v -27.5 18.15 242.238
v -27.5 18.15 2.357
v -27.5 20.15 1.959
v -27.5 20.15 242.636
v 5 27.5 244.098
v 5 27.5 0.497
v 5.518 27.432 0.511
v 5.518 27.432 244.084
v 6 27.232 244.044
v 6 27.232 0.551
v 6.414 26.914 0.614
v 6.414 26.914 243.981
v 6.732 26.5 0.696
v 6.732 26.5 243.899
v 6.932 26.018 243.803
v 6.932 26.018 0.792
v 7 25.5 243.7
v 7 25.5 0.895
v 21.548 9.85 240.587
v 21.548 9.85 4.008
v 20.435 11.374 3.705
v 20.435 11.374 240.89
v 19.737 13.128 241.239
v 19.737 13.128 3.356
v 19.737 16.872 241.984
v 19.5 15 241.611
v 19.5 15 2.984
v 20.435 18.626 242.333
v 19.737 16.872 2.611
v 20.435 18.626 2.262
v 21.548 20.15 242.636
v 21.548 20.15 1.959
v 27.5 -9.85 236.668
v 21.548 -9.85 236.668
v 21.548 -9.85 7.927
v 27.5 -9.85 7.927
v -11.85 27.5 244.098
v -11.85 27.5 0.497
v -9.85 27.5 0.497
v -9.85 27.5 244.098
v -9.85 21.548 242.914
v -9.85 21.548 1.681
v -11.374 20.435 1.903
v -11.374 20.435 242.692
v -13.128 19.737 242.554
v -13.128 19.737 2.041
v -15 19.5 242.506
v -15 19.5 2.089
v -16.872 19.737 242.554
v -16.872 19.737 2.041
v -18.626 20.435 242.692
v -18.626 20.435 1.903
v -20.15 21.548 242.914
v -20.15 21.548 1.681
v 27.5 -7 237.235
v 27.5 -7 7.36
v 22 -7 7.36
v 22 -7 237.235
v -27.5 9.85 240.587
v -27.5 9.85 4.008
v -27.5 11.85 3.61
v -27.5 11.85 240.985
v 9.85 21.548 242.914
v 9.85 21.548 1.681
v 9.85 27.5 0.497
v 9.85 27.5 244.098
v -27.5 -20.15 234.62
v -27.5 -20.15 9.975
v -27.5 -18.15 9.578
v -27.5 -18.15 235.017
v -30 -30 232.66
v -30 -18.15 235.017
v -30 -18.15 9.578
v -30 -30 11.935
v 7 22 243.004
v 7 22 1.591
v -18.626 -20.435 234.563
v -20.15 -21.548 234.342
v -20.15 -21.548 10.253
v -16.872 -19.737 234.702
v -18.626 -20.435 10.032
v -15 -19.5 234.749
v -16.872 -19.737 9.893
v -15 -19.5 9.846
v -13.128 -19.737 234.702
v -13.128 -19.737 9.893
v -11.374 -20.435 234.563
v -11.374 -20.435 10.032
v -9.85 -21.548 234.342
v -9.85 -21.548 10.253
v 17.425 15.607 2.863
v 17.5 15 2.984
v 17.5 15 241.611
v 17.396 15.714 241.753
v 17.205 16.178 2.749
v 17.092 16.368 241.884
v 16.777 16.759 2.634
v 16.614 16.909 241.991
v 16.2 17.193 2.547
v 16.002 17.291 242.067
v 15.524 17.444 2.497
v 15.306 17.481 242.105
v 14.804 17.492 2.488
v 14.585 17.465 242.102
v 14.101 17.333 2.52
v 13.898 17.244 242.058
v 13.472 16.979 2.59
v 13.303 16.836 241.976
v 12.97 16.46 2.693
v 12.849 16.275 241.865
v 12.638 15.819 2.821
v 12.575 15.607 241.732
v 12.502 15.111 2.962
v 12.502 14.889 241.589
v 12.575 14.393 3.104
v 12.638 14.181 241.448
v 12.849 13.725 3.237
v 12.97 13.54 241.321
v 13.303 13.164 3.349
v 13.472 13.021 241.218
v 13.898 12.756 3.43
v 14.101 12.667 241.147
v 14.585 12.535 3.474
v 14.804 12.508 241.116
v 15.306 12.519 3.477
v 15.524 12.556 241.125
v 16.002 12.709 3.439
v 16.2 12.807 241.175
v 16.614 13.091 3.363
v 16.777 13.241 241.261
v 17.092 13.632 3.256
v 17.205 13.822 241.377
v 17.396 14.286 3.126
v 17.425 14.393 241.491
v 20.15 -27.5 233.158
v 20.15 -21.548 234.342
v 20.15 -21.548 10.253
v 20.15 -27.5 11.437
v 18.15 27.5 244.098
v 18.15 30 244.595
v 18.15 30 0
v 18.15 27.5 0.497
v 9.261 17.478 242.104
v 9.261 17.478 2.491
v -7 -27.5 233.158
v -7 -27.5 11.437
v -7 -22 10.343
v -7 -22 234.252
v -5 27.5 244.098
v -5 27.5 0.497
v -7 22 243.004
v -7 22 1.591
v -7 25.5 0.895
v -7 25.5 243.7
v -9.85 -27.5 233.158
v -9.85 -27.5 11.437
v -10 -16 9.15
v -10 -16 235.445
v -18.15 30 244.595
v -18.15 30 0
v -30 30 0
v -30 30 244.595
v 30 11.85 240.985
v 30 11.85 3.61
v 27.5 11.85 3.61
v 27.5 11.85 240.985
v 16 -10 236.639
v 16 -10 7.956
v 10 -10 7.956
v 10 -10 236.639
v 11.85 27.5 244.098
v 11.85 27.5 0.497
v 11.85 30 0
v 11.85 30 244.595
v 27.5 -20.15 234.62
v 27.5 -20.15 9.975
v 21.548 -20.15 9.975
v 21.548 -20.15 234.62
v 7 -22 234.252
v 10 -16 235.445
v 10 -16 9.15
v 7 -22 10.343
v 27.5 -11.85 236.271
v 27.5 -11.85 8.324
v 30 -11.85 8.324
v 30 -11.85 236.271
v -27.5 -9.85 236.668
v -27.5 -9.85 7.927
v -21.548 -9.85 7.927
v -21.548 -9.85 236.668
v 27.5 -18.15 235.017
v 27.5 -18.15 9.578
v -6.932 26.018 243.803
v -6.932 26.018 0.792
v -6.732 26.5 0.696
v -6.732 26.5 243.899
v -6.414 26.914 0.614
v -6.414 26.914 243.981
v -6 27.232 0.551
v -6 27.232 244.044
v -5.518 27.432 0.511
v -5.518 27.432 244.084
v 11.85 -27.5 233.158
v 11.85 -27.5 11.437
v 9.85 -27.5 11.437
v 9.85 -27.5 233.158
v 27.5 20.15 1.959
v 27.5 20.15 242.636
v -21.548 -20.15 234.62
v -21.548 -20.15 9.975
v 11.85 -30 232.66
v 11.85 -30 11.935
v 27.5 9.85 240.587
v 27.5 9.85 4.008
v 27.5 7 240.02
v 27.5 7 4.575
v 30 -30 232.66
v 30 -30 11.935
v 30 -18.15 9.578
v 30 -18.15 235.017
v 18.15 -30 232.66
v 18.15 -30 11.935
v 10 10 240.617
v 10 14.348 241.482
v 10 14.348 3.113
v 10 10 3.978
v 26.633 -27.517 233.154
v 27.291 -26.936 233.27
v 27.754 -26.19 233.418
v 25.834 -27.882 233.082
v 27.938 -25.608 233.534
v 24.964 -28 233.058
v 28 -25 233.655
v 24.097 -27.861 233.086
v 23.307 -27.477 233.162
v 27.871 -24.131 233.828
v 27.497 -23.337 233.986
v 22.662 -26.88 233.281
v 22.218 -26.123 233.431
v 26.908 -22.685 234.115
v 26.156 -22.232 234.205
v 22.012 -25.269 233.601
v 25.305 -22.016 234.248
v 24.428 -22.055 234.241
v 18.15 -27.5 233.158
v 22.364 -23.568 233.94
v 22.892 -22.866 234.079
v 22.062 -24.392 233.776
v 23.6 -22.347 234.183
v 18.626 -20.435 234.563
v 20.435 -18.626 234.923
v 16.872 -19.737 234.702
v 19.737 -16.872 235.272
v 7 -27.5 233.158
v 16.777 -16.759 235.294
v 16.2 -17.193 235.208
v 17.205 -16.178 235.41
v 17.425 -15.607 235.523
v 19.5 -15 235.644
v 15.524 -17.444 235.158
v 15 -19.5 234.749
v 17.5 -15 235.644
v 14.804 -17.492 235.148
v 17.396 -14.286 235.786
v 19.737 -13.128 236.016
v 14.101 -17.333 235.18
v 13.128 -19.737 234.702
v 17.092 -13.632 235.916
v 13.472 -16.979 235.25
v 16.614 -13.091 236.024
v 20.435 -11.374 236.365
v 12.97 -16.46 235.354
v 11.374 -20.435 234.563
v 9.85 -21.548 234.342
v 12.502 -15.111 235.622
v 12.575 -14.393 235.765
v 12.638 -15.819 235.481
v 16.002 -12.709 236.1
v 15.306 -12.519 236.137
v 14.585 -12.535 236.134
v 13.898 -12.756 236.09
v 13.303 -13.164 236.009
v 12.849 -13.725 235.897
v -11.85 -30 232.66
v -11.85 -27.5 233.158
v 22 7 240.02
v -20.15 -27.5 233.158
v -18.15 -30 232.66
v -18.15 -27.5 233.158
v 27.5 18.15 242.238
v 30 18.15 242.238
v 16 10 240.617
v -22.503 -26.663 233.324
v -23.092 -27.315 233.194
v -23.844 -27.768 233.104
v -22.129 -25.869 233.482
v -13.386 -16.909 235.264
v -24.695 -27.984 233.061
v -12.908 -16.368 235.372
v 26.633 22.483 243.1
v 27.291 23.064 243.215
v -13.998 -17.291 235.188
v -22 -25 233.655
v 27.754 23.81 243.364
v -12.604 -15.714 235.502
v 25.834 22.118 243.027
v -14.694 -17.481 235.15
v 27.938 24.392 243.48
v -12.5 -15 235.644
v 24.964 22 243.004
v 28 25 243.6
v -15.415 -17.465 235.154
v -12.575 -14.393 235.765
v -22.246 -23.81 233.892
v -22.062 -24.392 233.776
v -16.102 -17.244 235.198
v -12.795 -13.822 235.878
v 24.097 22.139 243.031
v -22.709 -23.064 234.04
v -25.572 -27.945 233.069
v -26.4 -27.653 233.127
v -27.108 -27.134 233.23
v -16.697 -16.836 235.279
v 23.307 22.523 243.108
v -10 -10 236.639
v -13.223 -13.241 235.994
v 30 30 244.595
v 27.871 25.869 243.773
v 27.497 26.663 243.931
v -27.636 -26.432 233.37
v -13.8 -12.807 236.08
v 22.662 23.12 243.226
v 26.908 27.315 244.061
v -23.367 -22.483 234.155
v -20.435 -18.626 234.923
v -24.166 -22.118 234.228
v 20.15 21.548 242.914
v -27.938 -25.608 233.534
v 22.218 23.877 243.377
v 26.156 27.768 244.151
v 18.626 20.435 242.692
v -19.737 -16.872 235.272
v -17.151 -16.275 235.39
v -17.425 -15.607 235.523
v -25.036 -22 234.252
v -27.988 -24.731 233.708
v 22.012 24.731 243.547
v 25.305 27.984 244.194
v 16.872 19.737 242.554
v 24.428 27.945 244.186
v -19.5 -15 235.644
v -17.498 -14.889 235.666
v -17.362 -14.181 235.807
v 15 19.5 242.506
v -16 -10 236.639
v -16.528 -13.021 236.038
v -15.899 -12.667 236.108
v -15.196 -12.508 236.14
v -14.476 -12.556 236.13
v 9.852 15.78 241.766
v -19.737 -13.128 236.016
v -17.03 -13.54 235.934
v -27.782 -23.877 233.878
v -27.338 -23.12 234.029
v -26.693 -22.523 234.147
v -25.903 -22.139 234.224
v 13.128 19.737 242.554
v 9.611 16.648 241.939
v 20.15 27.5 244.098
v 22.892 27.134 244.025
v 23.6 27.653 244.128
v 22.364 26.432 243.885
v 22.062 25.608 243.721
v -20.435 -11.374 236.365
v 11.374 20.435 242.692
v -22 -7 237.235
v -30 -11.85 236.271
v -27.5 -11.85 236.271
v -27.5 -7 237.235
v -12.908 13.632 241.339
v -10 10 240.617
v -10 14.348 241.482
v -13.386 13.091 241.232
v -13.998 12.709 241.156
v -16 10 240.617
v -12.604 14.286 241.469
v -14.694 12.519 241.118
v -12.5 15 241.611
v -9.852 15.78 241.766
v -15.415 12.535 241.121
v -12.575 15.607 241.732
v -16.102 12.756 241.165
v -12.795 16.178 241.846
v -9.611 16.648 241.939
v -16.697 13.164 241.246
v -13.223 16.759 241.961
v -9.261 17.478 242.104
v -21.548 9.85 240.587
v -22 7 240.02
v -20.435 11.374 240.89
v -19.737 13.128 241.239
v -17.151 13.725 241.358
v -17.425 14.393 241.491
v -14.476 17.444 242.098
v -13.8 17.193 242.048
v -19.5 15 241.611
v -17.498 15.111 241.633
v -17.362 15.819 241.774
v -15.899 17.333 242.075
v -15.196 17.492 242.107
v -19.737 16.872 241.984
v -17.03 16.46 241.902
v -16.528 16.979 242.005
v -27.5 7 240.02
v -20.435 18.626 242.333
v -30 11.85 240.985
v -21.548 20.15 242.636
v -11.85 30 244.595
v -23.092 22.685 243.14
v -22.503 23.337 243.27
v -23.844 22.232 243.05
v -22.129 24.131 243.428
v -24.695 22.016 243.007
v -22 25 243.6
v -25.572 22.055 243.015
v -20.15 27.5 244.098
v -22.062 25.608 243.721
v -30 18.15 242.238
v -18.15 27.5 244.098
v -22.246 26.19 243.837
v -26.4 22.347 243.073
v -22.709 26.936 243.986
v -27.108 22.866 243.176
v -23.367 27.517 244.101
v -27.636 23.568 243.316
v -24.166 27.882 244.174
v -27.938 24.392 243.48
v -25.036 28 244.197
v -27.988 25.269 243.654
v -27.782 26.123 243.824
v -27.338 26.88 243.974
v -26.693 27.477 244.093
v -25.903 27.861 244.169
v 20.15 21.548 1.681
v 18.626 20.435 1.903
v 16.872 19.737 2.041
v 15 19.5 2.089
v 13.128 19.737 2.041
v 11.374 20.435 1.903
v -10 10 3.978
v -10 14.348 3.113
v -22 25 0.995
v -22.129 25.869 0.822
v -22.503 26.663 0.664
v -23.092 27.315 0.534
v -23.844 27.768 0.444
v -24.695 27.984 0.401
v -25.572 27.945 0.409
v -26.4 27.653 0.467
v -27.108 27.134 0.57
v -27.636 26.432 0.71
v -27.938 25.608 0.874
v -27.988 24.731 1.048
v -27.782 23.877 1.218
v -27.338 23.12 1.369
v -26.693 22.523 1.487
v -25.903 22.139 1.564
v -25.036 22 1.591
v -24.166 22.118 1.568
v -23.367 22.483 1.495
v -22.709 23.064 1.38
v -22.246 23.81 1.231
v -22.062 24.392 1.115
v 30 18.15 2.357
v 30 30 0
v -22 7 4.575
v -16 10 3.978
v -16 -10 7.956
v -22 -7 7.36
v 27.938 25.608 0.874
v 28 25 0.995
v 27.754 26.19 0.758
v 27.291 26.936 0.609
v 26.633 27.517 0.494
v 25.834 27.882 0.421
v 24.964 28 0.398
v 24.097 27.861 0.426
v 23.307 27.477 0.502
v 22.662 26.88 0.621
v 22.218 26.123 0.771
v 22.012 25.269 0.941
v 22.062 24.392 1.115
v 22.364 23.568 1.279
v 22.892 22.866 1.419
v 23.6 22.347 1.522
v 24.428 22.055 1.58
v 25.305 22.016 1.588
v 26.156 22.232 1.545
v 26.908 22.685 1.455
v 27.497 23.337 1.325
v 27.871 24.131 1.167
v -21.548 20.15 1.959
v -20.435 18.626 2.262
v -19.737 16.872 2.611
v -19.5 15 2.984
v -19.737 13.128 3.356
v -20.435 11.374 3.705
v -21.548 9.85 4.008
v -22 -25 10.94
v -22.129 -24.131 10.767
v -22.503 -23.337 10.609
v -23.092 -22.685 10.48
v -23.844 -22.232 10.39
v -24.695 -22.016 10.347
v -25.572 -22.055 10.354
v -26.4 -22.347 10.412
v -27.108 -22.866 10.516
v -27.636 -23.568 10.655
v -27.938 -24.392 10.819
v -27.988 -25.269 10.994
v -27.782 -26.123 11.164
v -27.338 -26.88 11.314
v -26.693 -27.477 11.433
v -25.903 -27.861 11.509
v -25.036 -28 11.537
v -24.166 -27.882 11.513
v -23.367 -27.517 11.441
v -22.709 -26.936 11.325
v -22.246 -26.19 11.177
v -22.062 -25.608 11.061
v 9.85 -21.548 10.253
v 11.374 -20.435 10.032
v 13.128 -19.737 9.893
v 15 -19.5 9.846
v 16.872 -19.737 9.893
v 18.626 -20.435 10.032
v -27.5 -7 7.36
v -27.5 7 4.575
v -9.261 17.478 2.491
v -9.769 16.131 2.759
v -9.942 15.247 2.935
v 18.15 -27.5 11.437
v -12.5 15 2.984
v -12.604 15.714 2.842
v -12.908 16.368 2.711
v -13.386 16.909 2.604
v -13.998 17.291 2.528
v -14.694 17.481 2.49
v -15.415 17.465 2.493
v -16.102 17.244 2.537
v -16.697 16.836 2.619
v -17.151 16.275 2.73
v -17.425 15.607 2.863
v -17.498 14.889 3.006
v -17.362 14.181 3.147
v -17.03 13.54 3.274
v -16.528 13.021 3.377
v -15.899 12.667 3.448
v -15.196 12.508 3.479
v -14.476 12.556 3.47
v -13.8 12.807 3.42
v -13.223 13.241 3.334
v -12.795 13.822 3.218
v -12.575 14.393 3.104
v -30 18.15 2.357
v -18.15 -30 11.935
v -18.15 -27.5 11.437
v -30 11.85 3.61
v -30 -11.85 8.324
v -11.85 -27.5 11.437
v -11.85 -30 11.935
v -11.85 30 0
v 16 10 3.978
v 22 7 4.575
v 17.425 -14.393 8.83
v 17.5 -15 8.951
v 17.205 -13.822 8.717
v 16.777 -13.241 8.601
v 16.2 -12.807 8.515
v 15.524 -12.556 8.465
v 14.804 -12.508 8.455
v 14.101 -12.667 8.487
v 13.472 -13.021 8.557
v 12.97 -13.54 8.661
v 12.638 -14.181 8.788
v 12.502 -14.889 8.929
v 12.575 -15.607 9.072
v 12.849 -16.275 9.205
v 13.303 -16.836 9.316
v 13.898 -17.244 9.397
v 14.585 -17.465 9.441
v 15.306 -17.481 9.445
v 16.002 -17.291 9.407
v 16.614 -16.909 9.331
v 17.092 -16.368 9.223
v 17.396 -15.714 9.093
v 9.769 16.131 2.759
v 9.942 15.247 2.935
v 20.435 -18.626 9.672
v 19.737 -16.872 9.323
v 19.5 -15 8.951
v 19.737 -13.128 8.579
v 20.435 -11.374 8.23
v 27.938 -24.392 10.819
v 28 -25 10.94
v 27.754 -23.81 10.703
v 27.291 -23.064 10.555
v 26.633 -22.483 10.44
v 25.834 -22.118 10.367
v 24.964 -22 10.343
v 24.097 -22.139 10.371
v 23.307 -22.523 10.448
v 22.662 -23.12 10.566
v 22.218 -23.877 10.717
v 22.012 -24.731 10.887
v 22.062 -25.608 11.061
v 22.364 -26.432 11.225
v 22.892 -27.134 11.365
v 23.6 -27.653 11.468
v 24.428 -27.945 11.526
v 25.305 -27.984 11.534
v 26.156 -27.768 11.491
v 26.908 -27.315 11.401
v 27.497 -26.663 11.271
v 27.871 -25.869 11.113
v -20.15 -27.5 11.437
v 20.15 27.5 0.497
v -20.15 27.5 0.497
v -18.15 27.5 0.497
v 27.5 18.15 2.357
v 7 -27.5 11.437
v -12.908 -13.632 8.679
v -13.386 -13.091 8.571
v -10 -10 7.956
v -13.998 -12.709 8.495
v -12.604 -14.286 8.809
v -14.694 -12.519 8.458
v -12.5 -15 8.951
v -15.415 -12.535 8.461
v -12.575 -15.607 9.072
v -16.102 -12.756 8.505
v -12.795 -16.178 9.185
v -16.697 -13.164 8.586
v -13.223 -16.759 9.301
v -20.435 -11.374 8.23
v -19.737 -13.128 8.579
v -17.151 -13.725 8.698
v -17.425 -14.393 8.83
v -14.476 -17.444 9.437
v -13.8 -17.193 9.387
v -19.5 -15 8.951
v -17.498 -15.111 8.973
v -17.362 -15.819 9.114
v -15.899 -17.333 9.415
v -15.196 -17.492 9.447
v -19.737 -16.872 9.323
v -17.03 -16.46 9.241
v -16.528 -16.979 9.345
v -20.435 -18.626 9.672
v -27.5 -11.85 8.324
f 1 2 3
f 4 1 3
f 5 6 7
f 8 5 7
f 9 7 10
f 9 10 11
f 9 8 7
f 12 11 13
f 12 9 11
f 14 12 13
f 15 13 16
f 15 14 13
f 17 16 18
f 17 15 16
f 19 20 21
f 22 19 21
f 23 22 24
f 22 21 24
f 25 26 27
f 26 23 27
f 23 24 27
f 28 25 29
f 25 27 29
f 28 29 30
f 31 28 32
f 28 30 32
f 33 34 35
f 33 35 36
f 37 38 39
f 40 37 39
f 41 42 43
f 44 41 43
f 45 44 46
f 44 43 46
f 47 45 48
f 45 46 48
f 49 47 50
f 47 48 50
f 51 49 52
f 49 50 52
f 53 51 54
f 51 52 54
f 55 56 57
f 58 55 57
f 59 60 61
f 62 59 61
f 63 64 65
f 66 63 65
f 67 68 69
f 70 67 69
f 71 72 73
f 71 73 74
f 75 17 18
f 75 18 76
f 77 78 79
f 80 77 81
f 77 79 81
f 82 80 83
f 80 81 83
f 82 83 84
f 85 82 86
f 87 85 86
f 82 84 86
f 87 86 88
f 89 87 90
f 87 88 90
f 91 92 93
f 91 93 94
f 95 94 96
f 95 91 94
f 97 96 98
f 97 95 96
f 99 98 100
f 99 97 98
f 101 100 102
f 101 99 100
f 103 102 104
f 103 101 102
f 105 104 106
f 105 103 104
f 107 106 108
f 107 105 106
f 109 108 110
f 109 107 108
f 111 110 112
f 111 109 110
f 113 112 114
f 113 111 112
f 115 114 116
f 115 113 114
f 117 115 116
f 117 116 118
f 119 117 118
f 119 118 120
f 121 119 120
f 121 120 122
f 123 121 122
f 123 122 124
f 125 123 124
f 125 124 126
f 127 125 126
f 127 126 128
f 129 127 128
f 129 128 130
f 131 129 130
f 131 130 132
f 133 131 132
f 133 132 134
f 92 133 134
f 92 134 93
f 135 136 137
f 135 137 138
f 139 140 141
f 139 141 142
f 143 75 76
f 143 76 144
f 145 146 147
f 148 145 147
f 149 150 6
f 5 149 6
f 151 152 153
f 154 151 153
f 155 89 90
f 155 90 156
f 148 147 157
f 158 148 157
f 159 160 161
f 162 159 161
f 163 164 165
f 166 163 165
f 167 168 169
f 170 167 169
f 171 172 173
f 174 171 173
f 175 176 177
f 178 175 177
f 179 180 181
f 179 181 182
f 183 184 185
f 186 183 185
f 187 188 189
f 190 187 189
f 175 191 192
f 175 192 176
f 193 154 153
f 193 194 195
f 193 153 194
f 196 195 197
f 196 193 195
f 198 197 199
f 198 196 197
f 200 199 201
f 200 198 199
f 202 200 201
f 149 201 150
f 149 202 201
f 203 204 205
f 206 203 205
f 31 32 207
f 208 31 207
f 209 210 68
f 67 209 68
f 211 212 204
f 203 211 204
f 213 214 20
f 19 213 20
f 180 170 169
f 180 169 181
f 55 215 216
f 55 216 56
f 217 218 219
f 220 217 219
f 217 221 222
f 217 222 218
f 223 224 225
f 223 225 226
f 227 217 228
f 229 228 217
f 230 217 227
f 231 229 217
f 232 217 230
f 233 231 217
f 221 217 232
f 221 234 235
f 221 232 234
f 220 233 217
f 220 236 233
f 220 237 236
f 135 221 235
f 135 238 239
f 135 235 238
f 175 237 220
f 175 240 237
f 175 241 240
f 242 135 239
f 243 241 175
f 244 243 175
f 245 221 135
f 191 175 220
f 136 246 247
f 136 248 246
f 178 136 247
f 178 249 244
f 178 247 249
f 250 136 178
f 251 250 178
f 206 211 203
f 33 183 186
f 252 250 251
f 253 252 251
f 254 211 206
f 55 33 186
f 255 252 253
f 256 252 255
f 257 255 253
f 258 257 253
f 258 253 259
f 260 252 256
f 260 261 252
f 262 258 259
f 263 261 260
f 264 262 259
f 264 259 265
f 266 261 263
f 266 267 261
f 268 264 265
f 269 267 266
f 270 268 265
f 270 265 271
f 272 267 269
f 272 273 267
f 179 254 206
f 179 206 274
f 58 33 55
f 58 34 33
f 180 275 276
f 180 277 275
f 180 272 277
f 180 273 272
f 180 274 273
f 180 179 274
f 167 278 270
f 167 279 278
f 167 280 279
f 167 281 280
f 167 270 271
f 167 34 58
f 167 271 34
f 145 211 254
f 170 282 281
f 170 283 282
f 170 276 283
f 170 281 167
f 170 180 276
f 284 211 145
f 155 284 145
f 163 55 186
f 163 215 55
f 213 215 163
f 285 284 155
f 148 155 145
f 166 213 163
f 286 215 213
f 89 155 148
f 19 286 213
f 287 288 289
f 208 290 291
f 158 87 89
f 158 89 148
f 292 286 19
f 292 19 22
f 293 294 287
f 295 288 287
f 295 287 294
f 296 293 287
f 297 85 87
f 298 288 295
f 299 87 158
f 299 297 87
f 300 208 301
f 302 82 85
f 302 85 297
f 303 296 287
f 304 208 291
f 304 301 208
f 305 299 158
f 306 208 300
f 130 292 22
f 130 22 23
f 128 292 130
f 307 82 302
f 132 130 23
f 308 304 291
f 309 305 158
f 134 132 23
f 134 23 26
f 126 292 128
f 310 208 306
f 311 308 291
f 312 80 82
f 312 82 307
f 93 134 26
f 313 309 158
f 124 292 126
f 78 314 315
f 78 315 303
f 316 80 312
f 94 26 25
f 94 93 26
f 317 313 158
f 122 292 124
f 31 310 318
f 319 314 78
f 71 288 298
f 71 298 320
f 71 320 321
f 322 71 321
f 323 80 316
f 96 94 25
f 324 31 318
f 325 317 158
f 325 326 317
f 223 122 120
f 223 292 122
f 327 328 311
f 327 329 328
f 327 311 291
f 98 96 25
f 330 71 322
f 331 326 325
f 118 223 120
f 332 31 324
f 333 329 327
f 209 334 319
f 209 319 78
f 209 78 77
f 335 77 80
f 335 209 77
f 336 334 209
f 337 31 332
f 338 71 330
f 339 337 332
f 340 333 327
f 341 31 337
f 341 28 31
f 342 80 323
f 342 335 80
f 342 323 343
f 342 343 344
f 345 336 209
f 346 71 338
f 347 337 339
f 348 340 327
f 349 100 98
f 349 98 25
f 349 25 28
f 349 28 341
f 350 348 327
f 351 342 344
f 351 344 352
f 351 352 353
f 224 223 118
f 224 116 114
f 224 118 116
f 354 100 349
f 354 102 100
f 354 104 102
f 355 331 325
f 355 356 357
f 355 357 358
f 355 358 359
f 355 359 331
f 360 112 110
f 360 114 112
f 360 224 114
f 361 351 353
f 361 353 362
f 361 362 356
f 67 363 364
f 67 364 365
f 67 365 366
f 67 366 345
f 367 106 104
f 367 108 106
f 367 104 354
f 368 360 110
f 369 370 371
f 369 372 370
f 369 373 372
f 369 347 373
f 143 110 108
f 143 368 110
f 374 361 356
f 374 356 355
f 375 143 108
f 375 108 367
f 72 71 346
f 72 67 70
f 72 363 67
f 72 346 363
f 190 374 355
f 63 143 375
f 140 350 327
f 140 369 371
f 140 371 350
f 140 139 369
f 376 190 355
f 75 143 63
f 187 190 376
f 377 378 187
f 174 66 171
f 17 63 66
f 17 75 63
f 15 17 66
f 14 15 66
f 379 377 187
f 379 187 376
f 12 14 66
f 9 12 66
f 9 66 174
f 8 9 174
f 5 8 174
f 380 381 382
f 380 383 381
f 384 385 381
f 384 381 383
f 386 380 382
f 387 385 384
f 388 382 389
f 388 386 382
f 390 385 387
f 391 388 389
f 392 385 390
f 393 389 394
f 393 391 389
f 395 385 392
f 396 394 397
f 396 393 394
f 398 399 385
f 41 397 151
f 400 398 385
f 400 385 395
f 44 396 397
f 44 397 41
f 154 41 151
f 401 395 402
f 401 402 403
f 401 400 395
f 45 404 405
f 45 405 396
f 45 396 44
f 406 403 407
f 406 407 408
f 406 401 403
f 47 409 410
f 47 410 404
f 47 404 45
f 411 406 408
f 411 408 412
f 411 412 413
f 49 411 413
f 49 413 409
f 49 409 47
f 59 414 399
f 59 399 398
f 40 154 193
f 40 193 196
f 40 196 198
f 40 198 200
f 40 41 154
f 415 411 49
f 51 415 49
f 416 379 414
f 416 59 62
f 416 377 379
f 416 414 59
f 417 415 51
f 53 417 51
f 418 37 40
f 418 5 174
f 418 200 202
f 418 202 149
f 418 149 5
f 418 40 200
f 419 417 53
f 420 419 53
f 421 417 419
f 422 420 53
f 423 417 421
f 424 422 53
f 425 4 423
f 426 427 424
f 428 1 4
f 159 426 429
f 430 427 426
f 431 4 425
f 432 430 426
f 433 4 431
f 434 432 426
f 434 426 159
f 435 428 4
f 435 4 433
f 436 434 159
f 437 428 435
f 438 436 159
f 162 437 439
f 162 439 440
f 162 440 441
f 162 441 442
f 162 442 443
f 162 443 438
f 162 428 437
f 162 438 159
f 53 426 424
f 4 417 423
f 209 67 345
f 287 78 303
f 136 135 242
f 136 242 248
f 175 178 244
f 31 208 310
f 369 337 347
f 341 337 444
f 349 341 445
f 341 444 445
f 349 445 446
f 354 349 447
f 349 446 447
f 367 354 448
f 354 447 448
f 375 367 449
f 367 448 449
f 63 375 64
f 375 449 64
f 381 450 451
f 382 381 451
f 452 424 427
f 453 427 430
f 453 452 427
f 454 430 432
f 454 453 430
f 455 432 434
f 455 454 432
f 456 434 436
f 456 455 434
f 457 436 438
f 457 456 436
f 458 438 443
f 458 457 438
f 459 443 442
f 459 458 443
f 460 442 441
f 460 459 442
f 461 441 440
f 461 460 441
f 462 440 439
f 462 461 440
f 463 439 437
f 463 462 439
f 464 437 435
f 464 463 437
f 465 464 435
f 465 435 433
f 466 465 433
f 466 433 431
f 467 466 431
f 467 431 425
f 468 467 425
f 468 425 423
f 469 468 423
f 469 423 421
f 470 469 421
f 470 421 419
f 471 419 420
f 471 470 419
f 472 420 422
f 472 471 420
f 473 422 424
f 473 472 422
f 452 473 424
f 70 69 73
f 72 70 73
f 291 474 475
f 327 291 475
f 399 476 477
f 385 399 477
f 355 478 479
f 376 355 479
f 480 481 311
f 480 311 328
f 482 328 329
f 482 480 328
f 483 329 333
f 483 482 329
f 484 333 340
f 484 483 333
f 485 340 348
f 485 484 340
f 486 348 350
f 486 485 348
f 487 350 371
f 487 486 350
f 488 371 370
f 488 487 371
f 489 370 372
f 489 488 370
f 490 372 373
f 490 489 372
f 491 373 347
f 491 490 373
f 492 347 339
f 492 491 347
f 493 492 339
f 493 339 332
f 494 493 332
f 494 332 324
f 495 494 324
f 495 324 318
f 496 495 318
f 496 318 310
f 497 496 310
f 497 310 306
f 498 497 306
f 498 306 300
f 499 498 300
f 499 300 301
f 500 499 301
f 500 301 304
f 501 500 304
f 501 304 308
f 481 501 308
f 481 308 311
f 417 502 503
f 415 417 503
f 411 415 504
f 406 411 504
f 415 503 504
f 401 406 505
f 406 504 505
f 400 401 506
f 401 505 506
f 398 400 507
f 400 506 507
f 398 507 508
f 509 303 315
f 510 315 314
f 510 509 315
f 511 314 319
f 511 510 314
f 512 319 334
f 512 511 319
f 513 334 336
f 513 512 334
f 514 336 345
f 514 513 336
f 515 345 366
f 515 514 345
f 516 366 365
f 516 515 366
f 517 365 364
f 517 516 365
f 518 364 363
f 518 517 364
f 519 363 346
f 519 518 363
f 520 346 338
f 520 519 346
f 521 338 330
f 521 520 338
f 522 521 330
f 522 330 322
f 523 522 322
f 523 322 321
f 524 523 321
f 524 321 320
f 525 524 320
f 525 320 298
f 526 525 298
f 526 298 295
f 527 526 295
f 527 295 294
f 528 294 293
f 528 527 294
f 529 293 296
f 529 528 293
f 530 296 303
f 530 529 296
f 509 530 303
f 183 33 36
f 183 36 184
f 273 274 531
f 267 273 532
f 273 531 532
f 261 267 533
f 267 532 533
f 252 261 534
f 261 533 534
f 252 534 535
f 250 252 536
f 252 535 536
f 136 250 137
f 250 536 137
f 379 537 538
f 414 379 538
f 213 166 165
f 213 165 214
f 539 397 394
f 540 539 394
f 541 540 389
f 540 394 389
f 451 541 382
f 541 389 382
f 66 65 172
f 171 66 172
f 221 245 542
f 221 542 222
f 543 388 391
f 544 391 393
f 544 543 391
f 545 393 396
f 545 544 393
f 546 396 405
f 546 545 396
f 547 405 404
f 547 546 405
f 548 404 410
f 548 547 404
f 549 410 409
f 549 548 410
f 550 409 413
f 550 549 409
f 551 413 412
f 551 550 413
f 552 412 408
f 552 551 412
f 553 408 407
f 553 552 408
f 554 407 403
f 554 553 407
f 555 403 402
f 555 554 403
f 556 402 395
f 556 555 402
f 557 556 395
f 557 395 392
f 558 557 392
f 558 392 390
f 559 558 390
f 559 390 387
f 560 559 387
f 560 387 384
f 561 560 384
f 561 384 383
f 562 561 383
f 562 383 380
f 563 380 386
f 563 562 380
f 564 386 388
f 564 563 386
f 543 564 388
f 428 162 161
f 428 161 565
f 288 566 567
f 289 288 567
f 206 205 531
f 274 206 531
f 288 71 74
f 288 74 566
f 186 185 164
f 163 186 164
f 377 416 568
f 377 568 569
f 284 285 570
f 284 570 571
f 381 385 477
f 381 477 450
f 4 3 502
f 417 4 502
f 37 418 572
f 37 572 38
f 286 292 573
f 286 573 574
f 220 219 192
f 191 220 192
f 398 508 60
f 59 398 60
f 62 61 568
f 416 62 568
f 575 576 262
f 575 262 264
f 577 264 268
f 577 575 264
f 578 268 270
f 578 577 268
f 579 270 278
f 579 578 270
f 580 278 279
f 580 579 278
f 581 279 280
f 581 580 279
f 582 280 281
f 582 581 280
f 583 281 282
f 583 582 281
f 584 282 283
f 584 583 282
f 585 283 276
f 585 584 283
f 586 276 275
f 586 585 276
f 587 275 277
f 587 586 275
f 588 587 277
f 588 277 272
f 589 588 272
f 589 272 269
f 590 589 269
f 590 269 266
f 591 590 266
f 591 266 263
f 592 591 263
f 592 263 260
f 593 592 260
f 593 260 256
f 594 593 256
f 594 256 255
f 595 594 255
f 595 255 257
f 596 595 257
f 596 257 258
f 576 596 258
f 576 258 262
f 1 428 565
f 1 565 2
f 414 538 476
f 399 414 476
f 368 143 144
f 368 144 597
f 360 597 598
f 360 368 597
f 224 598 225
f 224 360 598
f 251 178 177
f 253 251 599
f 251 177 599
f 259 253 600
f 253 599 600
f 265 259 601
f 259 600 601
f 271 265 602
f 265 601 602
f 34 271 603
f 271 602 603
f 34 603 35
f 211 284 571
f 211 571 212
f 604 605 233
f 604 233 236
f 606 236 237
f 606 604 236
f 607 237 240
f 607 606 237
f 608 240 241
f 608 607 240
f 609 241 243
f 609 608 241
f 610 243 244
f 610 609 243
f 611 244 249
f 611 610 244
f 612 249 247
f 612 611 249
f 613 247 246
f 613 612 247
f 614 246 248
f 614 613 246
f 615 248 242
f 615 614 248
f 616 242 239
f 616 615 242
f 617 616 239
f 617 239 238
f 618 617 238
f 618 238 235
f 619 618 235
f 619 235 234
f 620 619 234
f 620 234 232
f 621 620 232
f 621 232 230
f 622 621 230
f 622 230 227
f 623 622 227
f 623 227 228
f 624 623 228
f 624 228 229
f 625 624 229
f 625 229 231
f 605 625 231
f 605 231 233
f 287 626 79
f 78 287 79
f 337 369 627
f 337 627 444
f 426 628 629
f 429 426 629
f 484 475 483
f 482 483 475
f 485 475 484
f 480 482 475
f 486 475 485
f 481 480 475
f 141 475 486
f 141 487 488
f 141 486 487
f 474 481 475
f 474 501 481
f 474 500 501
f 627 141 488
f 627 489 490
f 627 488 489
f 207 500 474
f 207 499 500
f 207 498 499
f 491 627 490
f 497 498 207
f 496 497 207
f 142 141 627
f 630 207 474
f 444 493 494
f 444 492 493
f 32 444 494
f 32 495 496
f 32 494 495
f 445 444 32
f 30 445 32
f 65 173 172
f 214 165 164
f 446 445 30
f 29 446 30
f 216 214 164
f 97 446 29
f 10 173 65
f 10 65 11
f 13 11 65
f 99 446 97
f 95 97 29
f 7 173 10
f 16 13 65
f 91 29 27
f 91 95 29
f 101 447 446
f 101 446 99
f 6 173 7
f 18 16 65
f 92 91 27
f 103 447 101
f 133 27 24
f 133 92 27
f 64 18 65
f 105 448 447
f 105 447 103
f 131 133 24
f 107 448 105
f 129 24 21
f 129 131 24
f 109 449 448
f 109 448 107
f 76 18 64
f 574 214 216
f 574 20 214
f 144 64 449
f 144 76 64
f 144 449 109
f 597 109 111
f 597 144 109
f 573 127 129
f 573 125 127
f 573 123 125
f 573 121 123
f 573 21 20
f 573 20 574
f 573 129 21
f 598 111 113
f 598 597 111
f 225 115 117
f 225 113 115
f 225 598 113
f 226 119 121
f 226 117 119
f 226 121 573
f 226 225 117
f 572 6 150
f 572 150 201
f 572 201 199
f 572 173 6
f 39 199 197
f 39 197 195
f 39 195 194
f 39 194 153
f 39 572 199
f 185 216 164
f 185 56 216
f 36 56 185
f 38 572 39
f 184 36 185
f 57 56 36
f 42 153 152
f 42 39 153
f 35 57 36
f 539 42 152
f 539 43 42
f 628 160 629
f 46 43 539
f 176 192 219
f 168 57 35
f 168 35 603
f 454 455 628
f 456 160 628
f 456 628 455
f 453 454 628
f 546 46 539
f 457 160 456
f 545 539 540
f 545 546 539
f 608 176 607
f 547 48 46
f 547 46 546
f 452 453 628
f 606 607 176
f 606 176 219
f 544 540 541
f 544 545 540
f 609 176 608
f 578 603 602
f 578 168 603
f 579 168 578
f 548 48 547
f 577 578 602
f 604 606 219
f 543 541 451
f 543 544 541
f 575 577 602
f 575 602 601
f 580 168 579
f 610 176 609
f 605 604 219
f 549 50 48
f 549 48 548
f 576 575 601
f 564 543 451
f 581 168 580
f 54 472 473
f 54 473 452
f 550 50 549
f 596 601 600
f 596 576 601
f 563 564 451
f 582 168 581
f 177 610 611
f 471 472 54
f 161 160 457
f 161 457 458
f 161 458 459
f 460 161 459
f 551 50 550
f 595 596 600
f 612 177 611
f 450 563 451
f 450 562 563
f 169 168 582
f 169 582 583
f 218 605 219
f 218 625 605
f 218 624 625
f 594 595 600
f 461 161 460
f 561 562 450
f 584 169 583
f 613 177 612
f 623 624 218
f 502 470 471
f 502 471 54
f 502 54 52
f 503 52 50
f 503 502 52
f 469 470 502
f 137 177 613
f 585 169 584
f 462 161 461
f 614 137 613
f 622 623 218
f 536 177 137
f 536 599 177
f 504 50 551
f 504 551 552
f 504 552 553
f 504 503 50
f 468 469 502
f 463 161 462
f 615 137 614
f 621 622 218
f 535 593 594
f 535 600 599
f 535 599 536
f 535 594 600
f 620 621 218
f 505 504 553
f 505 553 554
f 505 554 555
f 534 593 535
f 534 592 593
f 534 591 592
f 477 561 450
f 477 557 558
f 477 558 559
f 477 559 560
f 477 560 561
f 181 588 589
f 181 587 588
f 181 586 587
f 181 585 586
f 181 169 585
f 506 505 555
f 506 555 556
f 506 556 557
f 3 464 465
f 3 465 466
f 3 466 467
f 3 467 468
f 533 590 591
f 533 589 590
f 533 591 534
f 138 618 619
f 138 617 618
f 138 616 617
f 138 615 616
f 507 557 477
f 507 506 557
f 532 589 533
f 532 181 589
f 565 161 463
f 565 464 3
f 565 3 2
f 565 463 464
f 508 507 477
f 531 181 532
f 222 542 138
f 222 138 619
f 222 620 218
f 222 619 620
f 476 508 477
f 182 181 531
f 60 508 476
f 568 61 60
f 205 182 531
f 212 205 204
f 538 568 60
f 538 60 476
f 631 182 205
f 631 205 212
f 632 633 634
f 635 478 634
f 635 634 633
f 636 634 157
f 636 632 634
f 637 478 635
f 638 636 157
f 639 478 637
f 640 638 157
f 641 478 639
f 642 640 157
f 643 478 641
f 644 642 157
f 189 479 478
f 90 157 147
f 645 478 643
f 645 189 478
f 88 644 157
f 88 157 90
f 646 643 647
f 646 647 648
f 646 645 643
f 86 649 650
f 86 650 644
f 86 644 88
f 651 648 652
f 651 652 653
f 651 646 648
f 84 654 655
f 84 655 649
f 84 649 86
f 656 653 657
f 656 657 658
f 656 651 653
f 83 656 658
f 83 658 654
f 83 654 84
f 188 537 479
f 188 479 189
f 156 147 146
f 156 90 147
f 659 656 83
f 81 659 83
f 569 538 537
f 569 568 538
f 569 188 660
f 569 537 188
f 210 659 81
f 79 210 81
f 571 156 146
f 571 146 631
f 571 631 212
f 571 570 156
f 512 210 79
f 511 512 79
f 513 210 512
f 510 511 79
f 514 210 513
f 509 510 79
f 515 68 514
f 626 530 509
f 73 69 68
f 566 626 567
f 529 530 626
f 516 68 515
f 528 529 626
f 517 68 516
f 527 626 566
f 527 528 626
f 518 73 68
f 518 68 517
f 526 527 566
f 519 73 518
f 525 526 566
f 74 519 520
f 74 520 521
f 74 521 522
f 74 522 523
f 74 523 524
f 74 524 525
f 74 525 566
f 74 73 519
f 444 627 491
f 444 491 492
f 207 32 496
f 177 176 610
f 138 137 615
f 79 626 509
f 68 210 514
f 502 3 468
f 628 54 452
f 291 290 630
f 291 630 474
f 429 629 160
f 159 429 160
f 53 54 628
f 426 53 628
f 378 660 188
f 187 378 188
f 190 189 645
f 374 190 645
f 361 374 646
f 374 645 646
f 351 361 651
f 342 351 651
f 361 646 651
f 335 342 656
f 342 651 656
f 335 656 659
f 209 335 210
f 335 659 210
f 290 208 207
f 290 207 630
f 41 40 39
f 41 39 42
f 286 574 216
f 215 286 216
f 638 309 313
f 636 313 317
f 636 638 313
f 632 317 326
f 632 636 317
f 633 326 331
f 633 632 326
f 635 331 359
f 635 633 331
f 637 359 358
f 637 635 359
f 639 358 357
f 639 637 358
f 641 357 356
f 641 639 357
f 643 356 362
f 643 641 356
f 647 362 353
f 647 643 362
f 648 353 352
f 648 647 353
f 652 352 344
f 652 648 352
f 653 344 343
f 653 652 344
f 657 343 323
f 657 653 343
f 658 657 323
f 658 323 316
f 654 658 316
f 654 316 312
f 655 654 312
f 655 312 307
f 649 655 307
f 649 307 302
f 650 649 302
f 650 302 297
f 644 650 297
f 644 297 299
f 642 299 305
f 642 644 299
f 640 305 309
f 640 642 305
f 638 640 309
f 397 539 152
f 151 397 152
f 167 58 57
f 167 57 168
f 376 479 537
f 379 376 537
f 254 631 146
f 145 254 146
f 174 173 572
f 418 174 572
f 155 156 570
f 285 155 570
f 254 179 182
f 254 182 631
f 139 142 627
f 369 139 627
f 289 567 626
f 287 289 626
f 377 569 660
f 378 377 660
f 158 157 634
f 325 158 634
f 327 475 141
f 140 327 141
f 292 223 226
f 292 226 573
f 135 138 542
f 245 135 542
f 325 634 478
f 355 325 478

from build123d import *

# Parameters (mm, degrees)
F0_R          = 3
F0_R_2        = 2.5
F1_DEPTH      = 244.595
F2_R          = 2
F3_R          = 7
F5_DEPTH      = 30
F5_DEPTH_BACK = 30


# Not quite as in the source:
# - a feature names something its author has since deleted; it is built from what else it names


with BuildPart() as f1:
    # F0 (on Top) → F1 (new body)
    with BuildSketch(Plane.XY):
        with BuildLine():
            Line((18.15, -30), (30, -30))
            Line((30, -30), (30, -18.15))
            Line((30, -18.15), (27.5, -18.15))
            Line((27.5, -18.15), (27.5, -20.15))
            Line((27.5, -20.15), (21.5477069044, -20.15))
            ThreePointArc((21.5477069044, -20.15), (19.5, -15), (21.5477069044, -9.85))
            Line((21.5477069044, -9.85), (27.5, -9.85))
            Line((27.5, -9.85), (27.5, -11.85))
            Line((27.5, -11.85), (30, -11.85))
            Line((30, -11.85), (30, 11.85))
            Line((30, 11.85), (27.5, 11.85))
            Line((27.5, 11.85), (27.5, 9.85))
            Line((27.5, 9.85), (21.5477069044, 9.85))
            ThreePointArc((21.5477069044, 9.85), (19.5, 15), (21.5477069044, 20.15))
            Line((21.5477069044, 20.15), (27.5, 20.15))
            Line((27.5, 20.15), (27.5, 18.15))
            Line((27.5, 18.15), (30, 18.15))
            Line((30, 18.15), (30, 30))
            Line((30, 30), (18.15, 30))
            Line((18.15, 30), (18.15, 27.5))
            Line((18.15, 27.5), (20.15, 27.5))
            Line((20.15, 27.5), (20.15, 21.5477069044))
            ThreePointArc((20.15, 21.5477069044), (15, 19.5), (9.85, 21.5477069044))
            Line((9.85, 21.5477069044), (9.85, 27.5))
            Line((9.85, 27.5), (11.85, 27.5))
            Line((11.85, 27.5), (11.85, 30))
            Line((11.85, 30), (-11.85, 30))
            Line((-11.85, 30), (-11.85, 27.5))
            Line((-11.85, 27.5), (-9.85, 27.5))
            Line((-9.85, 27.5), (-9.85, 21.5477069044))
            ThreePointArc((-9.85, 21.5477069044), (-15, 19.5), (-20.15, 21.5477069044))
            Line((-20.15, 21.5477069044), (-20.15, 27.5))
            Line((-20.15, 27.5), (-18.15, 27.5))
            Line((-18.15, 27.5), (-18.15, 30))
            Line((-18.15, 30), (-30, 30))
            Line((-30, 30), (-30, 18.15))
            Line((-30, 18.15), (-27.5, 18.15))
            Line((-27.5, 18.15), (-27.5, 20.15))
            Line((-27.5, 20.15), (-21.5477069044, 20.15))
            ThreePointArc((-21.5477069044, 20.15), (-19.5, 15), (-21.5477069044, 9.85))
            Line((-21.5477069044, 9.85), (-27.5, 9.85))
            Line((-27.5, 9.85), (-27.5, 11.85))
            Line((-27.5, 11.85), (-30, 11.85))
            Line((-30, 11.85), (-30, -11.85))
            Line((-30, -11.85), (-27.5, -11.85))
            Line((-27.5, -11.85), (-27.5, -9.85))
            Line((-27.5, -9.85), (-21.5477069044, -9.85))
            ThreePointArc((-21.5477069044, -9.85), (-19.5, -15), (-21.5477069044, -20.15))
            Line((-21.5477069044, -20.15), (-27.5, -20.15))
            Line((-27.5, -20.15), (-27.5, -18.15))
            Line((-27.5, -18.15), (-30, -18.15))
            Line((-30, -18.15), (-30, -30))
            Line((-30, -30), (-18.15, -30))
            Line((-18.15, -30), (-18.15, -27.5))
            Line((-18.15, -27.5), (-20.15, -27.5))
            Line((-20.15, -27.5), (-20.15, -21.5477069044))
            ThreePointArc((-20.15, -21.5477069044), (-15, -19.5), (-9.85, -21.5477069044))
            Line((-9.85, -21.5477069044), (-9.85, -27.5))
            Line((-9.85, -27.5), (-11.85, -27.5))
            Line((-11.85, -27.5), (-11.85, -30))
            Line((-11.85, -30), (11.85, -30))
            Line((11.85, -30), (11.85, -27.5))
            Line((11.85, -27.5), (9.85, -27.5))
            Line((9.85, -27.5), (9.85, -21.5477069044))
            ThreePointArc((9.85, -21.5477069044), (15, -19.5), (20.15, -21.5477069044))
            Line((20.15, -21.5477069044), (20.15, -27.5))
            Line((20.15, -27.5), (18.15, -27.5))
            Line((18.15, -27.5), (18.15, -30))
        make_face()
        with Locations((-25, -25)):
            Circle(F0_R, mode=Mode.SUBTRACT)
        with Locations((-15, -15)):
            Circle(F0_R_2, mode=Mode.SUBTRACT)
        with Locations((25, -25)):
            Circle(F0_R, mode=Mode.SUBTRACT)
        with Locations((15, -15)):
            Circle(F0_R_2, mode=Mode.SUBTRACT)
        with Locations((-25, 25)):
            Circle(F0_R, mode=Mode.SUBTRACT)
        with Locations((-15, 15)):
            Circle(F0_R_2, mode=Mode.SUBTRACT)
        Polygon((-7, 22), (-7, 27.5), (0, 27.5), (7, 27.5), (7, 22), (10, 16), (10, 10), (16, 10), (22, 7), (27.5, 7), (27.5, 0), (27.5, -7), (22, -7), (16, -10), (10, -10), (10, -16), (7, -22), (7, -27.5), (0, -27.5), (-7, -27.5), (-7, -22), (-10, -16), (-10, -10), (-16, -10), (-22, -7), (-27.5, -7), (-27.5, 0), (-27.5, 7), (-22, 7), (-16, 10), (-10, 10), (-10, 16), align=None, mode=Mode.SUBTRACT)
        with Locations((15, 15)):
            Circle(F0_R_2, mode=Mode.SUBTRACT)
        with Locations((25, 25)):
            Circle(F0_R, mode=Mode.SUBTRACT)
    extrude(amount=F1_DEPTH)

    # F2
    f2_edges = [f1.edges().sort_by_distance(p)[0] for p in [
        (-7, 27.5, 122.2975),
        (7, 27.5, 122.2975),
    ]]
    fillet(f2_edges, radius=F2_R)

    # F3
    f3_edges = [f1.edges().sort_by_distance(p)[0] for p in [
        (-10, 16, 122.2975),
        (10, 16, 122.2975),
    ]]
    fillet(f3_edges, radius=F3_R)

    # F4 (on Right) → F5 (cut, two sides)
    with BuildSketch(Plane.YZ) as f5_sk:
        Polygon((6.0593712047, -120.3576686088), (30, 0), (-94.0233882431, 24.6697857659), (-117.9640170384, -95.6878828429), align=None)
        Polygon((30, 244.595), (11.5280437604, 337.4597951001), (-122.8815300181, 310.7240685814), (-104.4095737785, 217.8592734812), align=None)
    extrude(amount=-F5_DEPTH, mode=Mode.SUBTRACT)
    extrude(f5_sk.sketch, amount=F5_DEPTH_BACK, mode=Mode.SUBTRACT)


solid = f1.part
